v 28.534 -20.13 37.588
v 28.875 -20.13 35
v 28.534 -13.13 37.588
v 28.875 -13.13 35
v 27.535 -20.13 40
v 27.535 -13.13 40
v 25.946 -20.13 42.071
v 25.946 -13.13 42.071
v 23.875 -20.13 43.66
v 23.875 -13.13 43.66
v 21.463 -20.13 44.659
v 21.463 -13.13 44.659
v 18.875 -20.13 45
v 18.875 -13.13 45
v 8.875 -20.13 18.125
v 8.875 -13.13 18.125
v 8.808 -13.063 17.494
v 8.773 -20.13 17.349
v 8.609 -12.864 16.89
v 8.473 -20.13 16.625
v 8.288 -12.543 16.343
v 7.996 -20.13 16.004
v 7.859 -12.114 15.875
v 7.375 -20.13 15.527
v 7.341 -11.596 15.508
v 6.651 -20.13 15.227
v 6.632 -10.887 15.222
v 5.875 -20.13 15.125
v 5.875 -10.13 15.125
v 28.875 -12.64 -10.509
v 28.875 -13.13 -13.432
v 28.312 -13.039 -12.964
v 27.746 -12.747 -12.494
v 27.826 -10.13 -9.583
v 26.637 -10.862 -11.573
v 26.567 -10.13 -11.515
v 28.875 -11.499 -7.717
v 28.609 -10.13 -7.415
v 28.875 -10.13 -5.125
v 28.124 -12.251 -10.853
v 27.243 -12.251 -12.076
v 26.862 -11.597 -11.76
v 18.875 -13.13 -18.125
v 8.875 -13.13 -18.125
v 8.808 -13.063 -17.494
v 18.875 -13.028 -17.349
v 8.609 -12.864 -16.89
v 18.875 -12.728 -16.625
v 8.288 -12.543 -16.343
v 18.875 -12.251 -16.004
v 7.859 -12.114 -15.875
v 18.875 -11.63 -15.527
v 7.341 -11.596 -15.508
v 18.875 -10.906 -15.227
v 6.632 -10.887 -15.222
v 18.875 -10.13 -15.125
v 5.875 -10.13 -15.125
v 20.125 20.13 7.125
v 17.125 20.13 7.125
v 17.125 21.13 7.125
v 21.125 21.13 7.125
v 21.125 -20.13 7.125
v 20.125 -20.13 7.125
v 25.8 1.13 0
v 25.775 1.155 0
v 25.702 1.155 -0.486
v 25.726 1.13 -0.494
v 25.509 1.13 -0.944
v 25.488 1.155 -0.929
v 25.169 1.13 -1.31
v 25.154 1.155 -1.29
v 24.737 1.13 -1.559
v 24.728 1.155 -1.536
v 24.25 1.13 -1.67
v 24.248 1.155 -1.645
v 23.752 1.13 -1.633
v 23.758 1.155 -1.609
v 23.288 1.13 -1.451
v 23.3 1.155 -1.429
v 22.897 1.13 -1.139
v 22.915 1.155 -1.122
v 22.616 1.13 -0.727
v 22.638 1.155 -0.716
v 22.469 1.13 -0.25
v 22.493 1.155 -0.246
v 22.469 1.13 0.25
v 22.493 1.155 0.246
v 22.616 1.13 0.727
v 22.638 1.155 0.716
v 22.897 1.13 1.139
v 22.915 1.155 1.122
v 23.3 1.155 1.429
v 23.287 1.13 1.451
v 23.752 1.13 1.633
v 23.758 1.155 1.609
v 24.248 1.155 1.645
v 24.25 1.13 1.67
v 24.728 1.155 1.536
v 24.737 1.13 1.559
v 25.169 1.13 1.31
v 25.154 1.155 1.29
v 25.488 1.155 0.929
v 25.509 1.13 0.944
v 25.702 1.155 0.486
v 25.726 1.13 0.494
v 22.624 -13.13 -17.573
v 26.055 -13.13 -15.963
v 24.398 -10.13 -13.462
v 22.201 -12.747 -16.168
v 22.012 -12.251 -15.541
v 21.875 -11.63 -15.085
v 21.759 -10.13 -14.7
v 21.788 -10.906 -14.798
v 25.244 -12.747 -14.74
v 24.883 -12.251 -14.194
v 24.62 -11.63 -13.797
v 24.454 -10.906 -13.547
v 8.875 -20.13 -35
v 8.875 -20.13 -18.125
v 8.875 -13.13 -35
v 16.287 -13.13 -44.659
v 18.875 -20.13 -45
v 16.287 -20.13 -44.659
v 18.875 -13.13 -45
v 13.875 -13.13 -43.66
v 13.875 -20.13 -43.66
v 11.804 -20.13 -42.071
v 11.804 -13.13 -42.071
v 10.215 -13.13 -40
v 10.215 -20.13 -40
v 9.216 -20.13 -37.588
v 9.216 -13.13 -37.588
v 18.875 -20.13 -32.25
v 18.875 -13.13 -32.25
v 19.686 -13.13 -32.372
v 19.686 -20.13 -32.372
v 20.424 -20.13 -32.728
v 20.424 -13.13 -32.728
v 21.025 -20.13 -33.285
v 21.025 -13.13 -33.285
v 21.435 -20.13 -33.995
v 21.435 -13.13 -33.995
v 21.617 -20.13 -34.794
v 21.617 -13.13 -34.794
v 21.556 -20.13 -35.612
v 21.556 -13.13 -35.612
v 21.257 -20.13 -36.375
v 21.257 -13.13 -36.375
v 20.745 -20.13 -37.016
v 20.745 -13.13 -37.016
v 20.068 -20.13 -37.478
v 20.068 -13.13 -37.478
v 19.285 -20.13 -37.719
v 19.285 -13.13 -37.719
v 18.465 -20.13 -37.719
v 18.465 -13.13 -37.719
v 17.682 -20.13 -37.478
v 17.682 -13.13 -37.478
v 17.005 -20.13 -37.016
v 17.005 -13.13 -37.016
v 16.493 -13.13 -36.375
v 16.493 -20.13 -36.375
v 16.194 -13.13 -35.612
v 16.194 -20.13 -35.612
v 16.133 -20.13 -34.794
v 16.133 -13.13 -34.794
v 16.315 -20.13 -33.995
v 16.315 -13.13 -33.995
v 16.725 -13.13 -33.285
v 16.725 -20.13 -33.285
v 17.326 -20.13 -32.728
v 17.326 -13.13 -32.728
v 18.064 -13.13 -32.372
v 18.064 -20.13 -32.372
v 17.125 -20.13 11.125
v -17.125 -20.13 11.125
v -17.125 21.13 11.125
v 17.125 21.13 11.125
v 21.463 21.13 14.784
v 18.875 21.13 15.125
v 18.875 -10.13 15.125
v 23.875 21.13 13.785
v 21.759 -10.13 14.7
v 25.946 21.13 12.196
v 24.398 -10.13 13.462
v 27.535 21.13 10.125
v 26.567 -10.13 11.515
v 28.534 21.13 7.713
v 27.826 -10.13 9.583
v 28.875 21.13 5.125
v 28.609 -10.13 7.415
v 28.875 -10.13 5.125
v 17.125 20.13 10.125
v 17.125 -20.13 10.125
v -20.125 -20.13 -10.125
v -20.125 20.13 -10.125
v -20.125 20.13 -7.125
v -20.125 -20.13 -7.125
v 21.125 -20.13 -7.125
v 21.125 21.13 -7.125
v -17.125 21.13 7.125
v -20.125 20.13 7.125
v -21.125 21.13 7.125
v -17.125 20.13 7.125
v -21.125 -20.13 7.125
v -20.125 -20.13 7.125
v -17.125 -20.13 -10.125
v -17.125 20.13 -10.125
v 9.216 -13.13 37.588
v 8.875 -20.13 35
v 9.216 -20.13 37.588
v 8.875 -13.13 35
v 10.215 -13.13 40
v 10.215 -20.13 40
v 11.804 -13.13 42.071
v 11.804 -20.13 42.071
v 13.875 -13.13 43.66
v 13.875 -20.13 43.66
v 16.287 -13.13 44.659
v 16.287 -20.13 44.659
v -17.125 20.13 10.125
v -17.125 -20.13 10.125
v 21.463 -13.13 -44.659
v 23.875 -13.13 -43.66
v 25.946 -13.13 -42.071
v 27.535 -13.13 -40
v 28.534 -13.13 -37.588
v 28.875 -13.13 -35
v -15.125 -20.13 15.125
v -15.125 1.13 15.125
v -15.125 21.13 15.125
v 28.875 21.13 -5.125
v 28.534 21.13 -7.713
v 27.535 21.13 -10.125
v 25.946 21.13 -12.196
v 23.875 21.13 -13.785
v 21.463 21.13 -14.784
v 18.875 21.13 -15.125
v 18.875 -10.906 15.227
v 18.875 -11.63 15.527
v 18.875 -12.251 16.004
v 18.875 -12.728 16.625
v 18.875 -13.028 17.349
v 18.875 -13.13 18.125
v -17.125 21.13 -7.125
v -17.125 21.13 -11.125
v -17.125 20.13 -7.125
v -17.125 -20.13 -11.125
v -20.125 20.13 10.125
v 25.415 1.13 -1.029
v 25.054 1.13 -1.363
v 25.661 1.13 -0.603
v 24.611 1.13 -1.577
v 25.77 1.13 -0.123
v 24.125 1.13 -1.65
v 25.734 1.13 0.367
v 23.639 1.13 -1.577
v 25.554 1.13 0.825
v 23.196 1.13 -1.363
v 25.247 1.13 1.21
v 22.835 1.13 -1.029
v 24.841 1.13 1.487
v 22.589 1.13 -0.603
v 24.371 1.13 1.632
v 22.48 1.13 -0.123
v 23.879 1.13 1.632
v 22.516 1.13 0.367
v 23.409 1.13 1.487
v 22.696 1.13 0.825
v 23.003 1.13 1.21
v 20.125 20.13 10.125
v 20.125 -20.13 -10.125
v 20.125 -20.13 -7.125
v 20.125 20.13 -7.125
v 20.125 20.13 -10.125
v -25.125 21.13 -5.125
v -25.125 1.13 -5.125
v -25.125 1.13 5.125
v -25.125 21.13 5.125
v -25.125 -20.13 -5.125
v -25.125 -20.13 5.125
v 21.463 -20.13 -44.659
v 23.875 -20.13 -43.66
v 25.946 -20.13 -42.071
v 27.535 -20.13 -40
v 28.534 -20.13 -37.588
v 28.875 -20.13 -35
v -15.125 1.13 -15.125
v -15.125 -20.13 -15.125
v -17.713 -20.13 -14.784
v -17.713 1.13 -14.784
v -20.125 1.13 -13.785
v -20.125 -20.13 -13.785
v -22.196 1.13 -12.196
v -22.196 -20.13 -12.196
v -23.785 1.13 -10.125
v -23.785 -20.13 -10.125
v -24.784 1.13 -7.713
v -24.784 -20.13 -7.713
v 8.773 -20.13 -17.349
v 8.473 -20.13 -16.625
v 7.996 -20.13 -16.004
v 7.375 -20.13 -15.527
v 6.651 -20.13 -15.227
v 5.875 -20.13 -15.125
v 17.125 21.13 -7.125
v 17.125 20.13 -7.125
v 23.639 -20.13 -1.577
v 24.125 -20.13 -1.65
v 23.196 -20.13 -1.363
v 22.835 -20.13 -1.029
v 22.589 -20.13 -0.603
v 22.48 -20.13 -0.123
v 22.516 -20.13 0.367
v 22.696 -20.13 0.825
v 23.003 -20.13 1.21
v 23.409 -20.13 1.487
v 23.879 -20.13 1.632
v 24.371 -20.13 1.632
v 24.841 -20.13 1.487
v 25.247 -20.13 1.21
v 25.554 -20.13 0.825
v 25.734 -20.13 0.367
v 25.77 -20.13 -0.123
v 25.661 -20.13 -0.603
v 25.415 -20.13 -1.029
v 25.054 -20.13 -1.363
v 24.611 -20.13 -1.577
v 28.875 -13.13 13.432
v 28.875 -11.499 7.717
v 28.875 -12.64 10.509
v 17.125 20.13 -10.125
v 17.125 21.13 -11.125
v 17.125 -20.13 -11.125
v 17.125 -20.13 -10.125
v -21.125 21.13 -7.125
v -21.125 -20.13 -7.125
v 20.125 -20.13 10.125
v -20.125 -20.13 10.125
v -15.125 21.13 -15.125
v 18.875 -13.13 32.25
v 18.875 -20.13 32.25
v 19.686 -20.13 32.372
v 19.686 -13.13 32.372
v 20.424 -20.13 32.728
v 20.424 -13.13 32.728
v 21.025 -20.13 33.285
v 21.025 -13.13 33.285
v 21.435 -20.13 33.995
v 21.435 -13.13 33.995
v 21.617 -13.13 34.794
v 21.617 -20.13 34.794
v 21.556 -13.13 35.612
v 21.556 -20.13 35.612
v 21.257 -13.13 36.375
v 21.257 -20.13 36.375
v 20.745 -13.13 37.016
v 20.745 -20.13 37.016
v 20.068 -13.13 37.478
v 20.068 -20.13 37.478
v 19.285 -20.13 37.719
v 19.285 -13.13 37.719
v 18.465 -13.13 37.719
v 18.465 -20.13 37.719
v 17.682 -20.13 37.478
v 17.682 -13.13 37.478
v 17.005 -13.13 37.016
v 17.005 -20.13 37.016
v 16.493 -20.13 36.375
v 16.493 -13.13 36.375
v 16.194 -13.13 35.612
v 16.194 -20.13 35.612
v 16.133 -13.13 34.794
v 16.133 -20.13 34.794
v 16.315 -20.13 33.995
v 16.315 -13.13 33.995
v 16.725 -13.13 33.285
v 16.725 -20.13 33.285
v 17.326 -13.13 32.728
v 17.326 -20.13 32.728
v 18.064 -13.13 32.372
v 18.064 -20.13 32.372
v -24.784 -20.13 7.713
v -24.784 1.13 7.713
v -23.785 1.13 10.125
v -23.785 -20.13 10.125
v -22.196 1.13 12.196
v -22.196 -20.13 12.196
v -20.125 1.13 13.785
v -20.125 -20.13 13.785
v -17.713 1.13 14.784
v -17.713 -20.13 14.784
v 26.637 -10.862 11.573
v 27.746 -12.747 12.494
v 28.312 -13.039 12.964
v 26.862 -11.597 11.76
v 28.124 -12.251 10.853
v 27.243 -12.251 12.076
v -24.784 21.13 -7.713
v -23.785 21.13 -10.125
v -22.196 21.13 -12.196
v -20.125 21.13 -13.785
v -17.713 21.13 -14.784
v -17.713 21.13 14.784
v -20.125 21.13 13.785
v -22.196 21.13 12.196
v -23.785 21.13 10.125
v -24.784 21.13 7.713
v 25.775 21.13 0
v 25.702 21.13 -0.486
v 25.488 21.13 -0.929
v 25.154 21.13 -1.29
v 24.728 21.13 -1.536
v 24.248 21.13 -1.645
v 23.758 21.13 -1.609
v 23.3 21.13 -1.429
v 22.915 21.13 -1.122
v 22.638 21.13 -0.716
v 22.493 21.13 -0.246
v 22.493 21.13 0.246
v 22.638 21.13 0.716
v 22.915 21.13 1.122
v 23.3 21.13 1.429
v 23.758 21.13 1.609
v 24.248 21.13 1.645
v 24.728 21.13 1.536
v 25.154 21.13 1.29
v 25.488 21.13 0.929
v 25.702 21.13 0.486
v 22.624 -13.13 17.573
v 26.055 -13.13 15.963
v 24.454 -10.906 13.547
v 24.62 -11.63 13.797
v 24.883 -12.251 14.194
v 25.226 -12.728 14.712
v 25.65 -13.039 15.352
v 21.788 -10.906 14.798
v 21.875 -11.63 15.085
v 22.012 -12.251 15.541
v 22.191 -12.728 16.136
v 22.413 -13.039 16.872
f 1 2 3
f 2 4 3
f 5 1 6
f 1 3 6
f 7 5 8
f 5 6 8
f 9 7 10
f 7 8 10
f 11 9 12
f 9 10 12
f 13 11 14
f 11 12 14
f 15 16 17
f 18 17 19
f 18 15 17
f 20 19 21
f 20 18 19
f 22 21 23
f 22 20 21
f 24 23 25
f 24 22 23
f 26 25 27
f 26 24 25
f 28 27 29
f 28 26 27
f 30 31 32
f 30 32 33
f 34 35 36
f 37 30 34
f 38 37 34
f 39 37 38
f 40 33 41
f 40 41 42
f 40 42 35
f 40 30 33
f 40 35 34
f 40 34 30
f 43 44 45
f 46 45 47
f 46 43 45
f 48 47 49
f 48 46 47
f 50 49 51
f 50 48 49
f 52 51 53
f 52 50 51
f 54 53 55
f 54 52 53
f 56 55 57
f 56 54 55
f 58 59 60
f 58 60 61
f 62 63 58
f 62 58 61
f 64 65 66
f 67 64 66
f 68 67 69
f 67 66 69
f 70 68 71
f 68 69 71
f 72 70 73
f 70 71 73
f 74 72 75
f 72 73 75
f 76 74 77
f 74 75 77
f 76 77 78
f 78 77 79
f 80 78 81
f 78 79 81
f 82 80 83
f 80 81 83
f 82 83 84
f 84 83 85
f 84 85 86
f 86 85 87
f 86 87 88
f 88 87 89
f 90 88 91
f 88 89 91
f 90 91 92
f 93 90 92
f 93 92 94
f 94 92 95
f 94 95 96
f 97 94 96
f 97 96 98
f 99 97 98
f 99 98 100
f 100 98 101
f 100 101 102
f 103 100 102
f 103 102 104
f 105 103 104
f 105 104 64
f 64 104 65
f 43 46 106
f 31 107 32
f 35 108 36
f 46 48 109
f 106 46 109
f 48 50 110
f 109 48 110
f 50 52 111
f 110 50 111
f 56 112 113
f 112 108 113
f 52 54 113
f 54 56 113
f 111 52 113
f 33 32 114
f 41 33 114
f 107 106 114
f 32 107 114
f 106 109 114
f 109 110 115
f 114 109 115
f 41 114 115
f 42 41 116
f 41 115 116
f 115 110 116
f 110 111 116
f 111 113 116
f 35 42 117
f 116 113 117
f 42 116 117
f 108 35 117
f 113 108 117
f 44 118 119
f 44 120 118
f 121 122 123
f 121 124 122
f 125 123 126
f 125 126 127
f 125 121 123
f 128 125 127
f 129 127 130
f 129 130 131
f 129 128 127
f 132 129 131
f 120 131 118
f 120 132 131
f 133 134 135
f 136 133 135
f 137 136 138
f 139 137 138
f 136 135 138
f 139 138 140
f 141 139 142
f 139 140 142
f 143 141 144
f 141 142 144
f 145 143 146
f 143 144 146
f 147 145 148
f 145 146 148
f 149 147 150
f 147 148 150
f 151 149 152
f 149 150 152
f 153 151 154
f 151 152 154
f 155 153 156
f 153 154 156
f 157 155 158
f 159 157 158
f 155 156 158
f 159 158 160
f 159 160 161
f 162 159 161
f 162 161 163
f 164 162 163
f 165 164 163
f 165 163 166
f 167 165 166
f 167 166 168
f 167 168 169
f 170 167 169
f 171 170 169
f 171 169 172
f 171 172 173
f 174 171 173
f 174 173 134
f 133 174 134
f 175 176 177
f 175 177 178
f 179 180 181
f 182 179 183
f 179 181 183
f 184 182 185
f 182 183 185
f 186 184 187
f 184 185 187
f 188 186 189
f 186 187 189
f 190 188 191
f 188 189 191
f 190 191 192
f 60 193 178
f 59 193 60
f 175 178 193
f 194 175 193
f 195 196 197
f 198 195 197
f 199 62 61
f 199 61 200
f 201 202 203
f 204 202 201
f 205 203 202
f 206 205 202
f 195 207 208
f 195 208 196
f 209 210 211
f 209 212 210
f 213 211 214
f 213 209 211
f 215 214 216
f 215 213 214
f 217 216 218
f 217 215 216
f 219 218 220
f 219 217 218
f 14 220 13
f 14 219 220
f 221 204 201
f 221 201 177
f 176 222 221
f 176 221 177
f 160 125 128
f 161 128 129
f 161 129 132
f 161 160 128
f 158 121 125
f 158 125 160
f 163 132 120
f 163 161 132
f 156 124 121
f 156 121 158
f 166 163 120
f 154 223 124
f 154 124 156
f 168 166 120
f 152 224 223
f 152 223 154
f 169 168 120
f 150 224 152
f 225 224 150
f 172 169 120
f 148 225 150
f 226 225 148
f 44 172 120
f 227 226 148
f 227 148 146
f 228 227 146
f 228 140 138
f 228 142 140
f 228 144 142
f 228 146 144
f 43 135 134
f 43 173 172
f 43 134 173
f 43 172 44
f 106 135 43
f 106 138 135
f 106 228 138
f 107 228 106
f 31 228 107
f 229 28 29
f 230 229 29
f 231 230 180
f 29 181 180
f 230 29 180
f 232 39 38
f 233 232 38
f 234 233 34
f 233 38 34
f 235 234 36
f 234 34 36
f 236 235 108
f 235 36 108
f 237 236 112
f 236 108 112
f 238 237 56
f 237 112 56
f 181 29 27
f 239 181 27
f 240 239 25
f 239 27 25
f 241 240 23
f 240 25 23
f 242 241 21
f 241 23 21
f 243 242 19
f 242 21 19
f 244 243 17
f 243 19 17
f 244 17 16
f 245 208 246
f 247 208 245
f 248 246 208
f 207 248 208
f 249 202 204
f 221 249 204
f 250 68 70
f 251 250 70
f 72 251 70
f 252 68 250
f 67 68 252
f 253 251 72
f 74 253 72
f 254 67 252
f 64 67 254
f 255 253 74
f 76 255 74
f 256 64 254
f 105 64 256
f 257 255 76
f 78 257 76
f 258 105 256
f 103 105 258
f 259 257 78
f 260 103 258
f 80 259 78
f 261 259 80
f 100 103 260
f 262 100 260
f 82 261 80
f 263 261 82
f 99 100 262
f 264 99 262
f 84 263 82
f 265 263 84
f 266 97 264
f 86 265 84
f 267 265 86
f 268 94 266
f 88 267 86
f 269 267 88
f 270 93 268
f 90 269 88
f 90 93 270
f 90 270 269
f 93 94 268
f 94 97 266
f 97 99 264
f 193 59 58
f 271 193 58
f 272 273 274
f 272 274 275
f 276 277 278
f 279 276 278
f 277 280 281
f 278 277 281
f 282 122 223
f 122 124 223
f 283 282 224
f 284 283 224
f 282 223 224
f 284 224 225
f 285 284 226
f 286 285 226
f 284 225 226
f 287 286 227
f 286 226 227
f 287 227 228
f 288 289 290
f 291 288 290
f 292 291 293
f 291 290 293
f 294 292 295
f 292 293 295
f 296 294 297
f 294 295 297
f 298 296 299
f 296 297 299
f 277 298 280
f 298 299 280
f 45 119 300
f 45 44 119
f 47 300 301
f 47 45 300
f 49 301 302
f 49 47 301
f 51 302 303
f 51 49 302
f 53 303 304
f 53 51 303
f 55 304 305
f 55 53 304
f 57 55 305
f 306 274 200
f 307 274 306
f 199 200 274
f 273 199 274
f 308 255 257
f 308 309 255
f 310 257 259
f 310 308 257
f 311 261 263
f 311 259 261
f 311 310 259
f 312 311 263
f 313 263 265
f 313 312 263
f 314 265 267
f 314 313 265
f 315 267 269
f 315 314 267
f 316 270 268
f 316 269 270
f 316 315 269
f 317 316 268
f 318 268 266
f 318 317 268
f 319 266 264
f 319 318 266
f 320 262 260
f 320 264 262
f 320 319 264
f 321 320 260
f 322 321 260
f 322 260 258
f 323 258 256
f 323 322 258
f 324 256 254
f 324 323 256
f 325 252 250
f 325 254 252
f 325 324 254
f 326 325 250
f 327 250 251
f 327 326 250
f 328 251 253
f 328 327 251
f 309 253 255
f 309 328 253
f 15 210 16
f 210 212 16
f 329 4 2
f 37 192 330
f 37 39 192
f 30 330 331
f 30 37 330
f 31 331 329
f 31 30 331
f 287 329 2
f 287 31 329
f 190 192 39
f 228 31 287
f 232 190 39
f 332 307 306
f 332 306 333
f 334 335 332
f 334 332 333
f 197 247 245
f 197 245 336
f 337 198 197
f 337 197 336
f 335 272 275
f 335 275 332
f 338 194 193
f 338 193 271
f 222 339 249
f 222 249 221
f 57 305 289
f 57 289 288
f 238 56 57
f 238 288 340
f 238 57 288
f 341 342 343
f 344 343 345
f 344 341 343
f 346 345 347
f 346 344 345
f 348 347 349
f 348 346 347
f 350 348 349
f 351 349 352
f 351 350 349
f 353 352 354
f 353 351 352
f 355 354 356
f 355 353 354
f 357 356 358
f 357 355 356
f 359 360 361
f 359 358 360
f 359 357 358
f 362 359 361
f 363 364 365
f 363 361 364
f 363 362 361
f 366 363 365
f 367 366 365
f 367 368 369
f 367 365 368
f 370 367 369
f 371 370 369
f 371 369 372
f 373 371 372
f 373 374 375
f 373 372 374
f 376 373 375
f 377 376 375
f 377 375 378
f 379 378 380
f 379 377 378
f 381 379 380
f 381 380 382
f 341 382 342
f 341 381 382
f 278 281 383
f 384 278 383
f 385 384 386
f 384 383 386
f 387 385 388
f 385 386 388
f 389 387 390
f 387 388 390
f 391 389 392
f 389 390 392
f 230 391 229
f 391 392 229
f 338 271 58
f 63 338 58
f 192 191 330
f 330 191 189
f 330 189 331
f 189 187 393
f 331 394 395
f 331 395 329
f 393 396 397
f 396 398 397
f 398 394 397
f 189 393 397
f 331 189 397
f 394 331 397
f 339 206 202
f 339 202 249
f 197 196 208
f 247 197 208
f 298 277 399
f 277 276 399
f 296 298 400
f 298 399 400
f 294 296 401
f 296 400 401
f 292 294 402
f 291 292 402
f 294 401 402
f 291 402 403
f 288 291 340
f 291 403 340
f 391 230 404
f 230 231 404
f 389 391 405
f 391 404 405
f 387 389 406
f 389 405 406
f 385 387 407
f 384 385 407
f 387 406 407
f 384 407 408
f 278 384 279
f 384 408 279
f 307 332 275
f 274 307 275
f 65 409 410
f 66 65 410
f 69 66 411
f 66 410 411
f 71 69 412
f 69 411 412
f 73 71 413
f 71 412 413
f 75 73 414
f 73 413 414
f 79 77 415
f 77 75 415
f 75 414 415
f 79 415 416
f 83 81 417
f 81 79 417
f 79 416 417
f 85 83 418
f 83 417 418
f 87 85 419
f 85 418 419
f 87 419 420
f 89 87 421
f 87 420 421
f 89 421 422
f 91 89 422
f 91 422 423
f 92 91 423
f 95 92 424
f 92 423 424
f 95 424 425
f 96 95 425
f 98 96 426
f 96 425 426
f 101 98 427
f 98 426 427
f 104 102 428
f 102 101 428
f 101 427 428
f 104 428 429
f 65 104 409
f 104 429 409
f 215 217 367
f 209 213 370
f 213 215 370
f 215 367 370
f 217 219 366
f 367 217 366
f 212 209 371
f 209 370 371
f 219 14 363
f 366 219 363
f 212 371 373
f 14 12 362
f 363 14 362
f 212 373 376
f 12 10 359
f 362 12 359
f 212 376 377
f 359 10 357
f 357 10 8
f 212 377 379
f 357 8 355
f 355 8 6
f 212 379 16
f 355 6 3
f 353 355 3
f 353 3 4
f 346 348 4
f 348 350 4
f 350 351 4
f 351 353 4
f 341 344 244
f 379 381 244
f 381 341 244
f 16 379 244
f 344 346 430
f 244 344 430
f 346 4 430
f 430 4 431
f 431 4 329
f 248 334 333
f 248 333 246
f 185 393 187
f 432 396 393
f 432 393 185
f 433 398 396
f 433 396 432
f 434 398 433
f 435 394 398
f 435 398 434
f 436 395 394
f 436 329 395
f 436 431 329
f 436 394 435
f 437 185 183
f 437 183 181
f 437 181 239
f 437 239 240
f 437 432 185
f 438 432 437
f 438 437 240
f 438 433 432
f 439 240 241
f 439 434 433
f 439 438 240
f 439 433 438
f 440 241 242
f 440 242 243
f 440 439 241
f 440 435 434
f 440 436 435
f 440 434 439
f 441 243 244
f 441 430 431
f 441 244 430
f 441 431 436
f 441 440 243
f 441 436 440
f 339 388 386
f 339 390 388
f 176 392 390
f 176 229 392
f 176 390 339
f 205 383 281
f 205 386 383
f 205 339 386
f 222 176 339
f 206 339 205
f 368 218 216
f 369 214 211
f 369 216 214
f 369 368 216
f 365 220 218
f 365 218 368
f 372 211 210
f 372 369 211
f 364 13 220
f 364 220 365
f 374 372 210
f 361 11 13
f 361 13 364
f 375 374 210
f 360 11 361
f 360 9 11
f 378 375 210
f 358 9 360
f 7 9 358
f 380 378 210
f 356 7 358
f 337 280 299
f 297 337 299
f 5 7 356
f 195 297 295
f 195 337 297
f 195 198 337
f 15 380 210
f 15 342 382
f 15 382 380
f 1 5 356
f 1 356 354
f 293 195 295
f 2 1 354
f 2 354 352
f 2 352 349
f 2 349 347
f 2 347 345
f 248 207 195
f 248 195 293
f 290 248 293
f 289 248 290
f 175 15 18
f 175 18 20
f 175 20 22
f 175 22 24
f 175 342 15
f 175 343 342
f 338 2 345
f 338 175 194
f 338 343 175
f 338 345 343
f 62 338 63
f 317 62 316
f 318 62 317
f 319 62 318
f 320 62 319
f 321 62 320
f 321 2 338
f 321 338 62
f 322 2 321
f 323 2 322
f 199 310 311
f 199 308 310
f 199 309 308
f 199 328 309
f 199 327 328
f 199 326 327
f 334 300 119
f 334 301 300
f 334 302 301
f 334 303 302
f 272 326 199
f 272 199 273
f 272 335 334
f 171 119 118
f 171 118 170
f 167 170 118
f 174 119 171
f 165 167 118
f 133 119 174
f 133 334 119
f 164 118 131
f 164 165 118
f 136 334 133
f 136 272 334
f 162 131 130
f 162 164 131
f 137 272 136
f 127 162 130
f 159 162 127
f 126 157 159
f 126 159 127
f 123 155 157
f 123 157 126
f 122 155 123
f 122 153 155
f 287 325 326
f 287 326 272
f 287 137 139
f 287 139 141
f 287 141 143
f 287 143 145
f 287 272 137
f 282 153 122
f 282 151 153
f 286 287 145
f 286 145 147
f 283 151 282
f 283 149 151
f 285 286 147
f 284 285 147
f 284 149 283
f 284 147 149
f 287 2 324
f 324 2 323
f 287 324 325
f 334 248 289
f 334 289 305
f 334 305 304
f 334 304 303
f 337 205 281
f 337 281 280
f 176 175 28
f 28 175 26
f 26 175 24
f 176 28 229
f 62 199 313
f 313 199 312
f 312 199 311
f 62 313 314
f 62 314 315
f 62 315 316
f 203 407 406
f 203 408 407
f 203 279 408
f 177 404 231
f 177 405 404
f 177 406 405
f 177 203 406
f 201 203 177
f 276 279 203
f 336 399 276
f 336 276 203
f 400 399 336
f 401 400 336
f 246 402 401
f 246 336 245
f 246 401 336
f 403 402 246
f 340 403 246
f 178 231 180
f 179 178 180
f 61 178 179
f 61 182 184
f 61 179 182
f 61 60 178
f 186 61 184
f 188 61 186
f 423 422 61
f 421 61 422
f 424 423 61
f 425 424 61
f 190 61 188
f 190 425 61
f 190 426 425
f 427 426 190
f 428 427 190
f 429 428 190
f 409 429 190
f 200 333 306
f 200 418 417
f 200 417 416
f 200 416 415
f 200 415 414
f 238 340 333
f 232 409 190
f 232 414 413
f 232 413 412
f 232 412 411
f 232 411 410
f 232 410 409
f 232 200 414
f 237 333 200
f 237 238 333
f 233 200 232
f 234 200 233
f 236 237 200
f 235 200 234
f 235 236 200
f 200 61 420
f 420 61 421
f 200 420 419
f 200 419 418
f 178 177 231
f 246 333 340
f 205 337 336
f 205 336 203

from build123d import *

# Parameters (mm, degrees)
BOSS_EXTRUDE1_DEPTH                   = 1
BOSS_EXTRUDE1_DEPTH_BACK              = 19
SKETCH1_W                             = 50.25
SKETCH1_H                             = 30.25
BOSS_EXTRUDE2_DEPTH                   = 30.25
BOSS_EXTRUDE3_DEPTH                   = 5
M6_CLEARANCE_HOLE1_D                  = 6.6
M6_CLEARANCE_HOLE1_CSINK_D            = 6.65
M6_CLEARANCE_HOLE1_CSINK_ANGLE        = 90
SKETCH6_W                             = 4
SKETCH6_H                             = 4
BOSS_EXTRUDE4_DEPTH                   = 1
FILLET1_R                             = 10
TAP_DRILL_FOR_M4X0_7_TAP1_D           = 3.3
TAP_DRILL_FOR_M4X0_7_TAP1_CSINK_D     = 3.35
TAP_DRILL_FOR_M4X0_7_TAP1_CSINK_ANGLE = 90
CUT_EXTRUDE1_DEPTH                    = 92.330529534
CUT_EXTRUDE1_DEPTH_BACK               = 92.330529534
SKETCH13_OUTSIDE_W                    = 121.742
SKETCH13_OUTSIDE_H                    = 131.492
BOSS_EXTRUDE5_START                   = 21.26
BOSS_EXTRUDE5_DEPTH                   = 21.26
CUT_EXTRUDE2_DEPTH                    = 53.582495662
CUT_EXTRUDE2_DEPTH_BACK               = 53.582495662
SKETCH15_R                            = 1.65
BOSS_EXTRUDE6_REACH                   = 66.778
SKETCH16_W                            = 10
SKETCH16_H                            = 7
SKETCH17_W                            = 29.875
SKETCH17_H                            = 7
BOSS_EXTRUDE7_DEPTH                   = 20
FILLET5_R                             = 10
FILLET6_R                             = 3
SKETCH19_R                            = 2.75
CUT_EXTRUDE4_DEPTH                    = 64.502072703
FILLET7_R                             = 3
FILLET8_R                             = 10


with BuildPart() as part:
    # Sketch1 → Boss-Extrude1 (new, two sides: drawn at the far end of the back side and taken through both)
    with BuildSketch(Plane(origin=(0, 20.13, 0), x_dir=(1, 0, 0), z_dir=(0, 1, 0)).offset(-BOSS_EXTRUDE1_DEPTH_BACK)):
        Rectangle(SKETCH1_W, SKETCH1_H)
        Polygon((20.125, 10.125), (17.125, 10.125), (17.125, 11.125), (-17.125, 11.125), (-17.125, 10.125), (-20.125, 10.125), (-20.125, 7.125), (-21.125, 7.125), (-21.125, -7.125), (-20.125, -7.125), (-20.125, -10.125), (-17.125, -10.125), (-17.125, -11.125), (17.125, -11.125), (17.125, -10.125), (20.125, -10.125), (20.125, -7.125), (21.125, -7.125), (21.125, 7.125), (20.125, 7.125), align=None, mode=Mode.SUBTRACT)
    extrude(amount=BOSS_EXTRUDE1_DEPTH + BOSS_EXTRUDE1_DEPTH_BACK)

    # Sketch2 → Boss-Extrude2 (add)
    with BuildSketch(Plane.XY.offset(15.125)):
        Polygon((25.125, 21.13), (45.125, 21.13), (45.125, 61.13), (65.125, 61.13), (65.125, 1.13), (25.125, 1.13), align=None)
    extrude(amount=-BOSS_EXTRUDE2_DEPTH)

    # Sketch3 → Boss-Extrude3 (add)
    with BuildSketch(Plane(origin=(0, 61.13, 0), x_dir=(1, 0, 0), z_dir=(0, 1, 0))):
        with BuildLine():
            Line((65.125, 40), (65.125, -40))
            ThreePointArc((65.125, -40), (55.125, -50), (45.125, -40))
            Line((45.125, -40), (45.125, 40))
            ThreePointArc((45.125, 40), (55.125, 50), (65.125, 40))
        make_face()
    extrude(amount=-BOSS_EXTRUDE3_DEPTH)

    # M6 Clearance Hole1 (through all)
    with Locations(Plane(origin=(0, 56.13, 0), x_dir=(-1, 0, 0), z_dir=(0, -1, 0))):
        with Locations((-55.125, -40), (-55.125, 40)):
            CounterSinkHole(M6_CLEARANCE_HOLE1_D / 2, M6_CLEARANCE_HOLE1_CSINK_D / 2, counter_sink_angle=M6_CLEARANCE_HOLE1_CSINK_ANGLE)

    # Sketch6 → Boss-Extrude4 (add)
    with BuildSketch(Plane(origin=(0, 21.13, 0), x_dir=(1, 0, 0), z_dir=(0, 1, 0))):
        with Locations((19.125, 9.125)):
            Rectangle(SKETCH6_W, SKETCH6_H)
        with Locations((19.125, -9.125)):
            Rectangle(SKETCH6_W, SKETCH6_H)
        with Locations((-19.125, -9.125)):
            Rectangle(SKETCH6_W, SKETCH6_H)
        with Locations((-19.125, 9.125)):
            Rectangle(SKETCH6_W, SKETCH6_H)
    extrude(amount=-BOSS_EXTRUDE4_DEPTH)

    # Fillet1
    fillet1_edges = [part.edges().sort_by_distance(p)[0] for p in [
        (45.125, 21.13, 0),
        (65.125, 1.13, 0),
        (55.125, 56.13, -15.125),
        (55.125, 56.13, 15.125),
        (-25.125, 11.13, 15.125),
        (-25.125, 11.13, -15.125),
    ]]
    fillet(fillet1_edges, radius=FILLET1_R)

    # Tap Drill for M4x0.7 Tap1 (through all)
    with Locations(Plane(origin=(0, 1.13, 0), x_dir=(-1, 0, 0), z_dir=(0, -1, 0))):
        with Locations((-24.125, 0)):
            CounterSinkHole(TAP_DRILL_FOR_M4X0_7_TAP1_D / 2, TAP_DRILL_FOR_M4X0_7_TAP1_CSINK_D / 2, counter_sink_angle=TAP_DRILL_FOR_M4X0_7_TAP1_CSINK_ANGLE)

    # Sketch13 outside → Cut-Extrude1 (cut, two sides: drawn at the far end of the back side and taken through both)
    with BuildSketch(Plane(origin=(0, 21.13, 0), x_dir=(1, 0, 0), z_dir=(0, 1, 0)).offset(-CUT_EXTRUDE1_DEPTH_BACK)):
        with Locations((20, 0)):
            Rectangle(SKETCH13_OUTSIDE_W, SKETCH13_OUTSIDE_H)
        with BuildLine():
            Line((28.875, 5.125), (28.875, -5.125))
            ThreePointArc((28.875, -5.125), (25.946067812, -12.196067812), (18.875, -15.125))
            Line((18.875, -15.125), (-15.125, -15.125))
            ThreePointArc((-15.125, -15.125), (-22.196067812, -12.196067812), (-25.125, -5.125))
            Line((-25.125, -5.125), (-25.125, 5.125))
            ThreePointArc((-25.125, 5.125), (-22.196067812, 12.196067812), (-15.125, 15.125))
            Line((-15.125, 15.125), (18.875, 15.125))
            ThreePointArc((18.875, 15.125), (25.946067812, 12.196067812), (28.875, 5.125))
        make_face(mode=Mode.SUBTRACT)
    extrude(amount=CUT_EXTRUDE1_DEPTH + CUT_EXTRUDE1_DEPTH_BACK, mode=Mode.SUBTRACT)

    # Sketch14 → Boss-Extrude5 (add)
    with BuildSketch(Plane.XZ.offset(-1.13).offset(BOSS_EXTRUDE5_START)):
        with BuildLine():
            Line((28.875, 5.125), (28.875, -5.125))
            ThreePointArc((28.875, -5.125), (25.946067812, -12.196067812), (18.875, -15.125))
            Line((18.875, -15.125), (-15.125, -15.125))
            ThreePointArc((-15.125, -15.125), (-22.196067812, -12.196067812), (-25.125, -5.125))
            Line((-25.125, -5.125), (-25.125, 5.125))
            ThreePointArc((-25.125, 5.125), (-22.196067812, 12.196067812), (-15.125, 15.125))
            Line((-15.125, 15.125), (18.875, 15.125))
            ThreePointArc((18.875, 15.125), (25.946067812, 12.196067812), (28.875, 5.125))
        make_face()
        Polygon((-21.125, 7.125), (-20.125, 7.125), (-20.125, 10.125), (-17.125, 10.125), (-17.125, 11.125), (17.125, 11.125), (17.125, 10.125), (20.125, 10.125), (20.125, 7.125), (21.125, 7.125), (21.125, -7.125), (20.125, -7.125), (20.125, -10.125), (17.125, -10.125), (17.125, -11.125), (-17.125, -11.125), (-17.125, -10.125), (-20.125, -10.125), (-20.125, -7.125), (-21.125, -7.125), align=None, mode=Mode.SUBTRACT)
    extrude(amount=-BOSS_EXTRUDE5_DEPTH)

    # Sketch15 → Cut-Extrude2 (cut, two sides: drawn at the far end of the back side and taken through both)
    with BuildSketch(Plane(origin=(0, 21.13, 0), x_dir=(1, 0, 0), z_dir=(0, 1, 0)).offset(-CUT_EXTRUDE2_DEPTH_BACK)):
        with Locations(Location((24.125, 0, 0), (0, 0, 90))):
            Circle(SKETCH15_R)
    extrude(amount=CUT_EXTRUDE2_DEPTH + CUT_EXTRUDE2_DEPTH_BACK, mode=Mode.SUBTRACT)

    # Sketch16 → Boss-Extrude6 (add, up to next)
    with BuildSketch(Plane(origin=(28.875, 0, 13.75), x_dir=(0, 0, 1), z_dir=(-1, 0, 0)), mode=Mode.PRIVATE) as boss_extrude6_sk1:
        with Locations((-23.875, -16.63)):
            Rectangle(SKETCH16_W, SKETCH16_H)
    boss_extrude6_tool1 = extrude(boss_extrude6_sk1.sketch, amount=BOSS_EXTRUDE6_REACH, mode=Mode.PRIVATE) - part.part
    boss_extrude6 = boss_extrude6_tool1.solids().sort_by_distance((28.875, -16.63, -10.125))[0]
    add(boss_extrude6)

    # Sketch17 → Boss-Extrude7 (add)
    with BuildSketch(Plane.ZY.offset(-28.875)):
        with Locations((-30.0625, -16.63)):
            Rectangle(SKETCH17_W, SKETCH17_H)
    boss_extrude7 = extrude(amount=BOSS_EXTRUDE7_DEPTH)

    # Fillet5
    fillet5_edges = [part.edges().sort_by_distance(p)[0] for p in [
        (8.875, -16.63, -45),
        (28.875, -16.63, -45),
    ]]
    fillet(fillet5_edges, radius=FILLET5_R - 0.0001)  # a hair under: the kernel refuses the full size

    # Fillet6
    fillet6_edges = [part.edges().sort_by_distance(p)[0] for p in [
        (25.946067812, -13.13, -12.196067812),
        (13.875, -13.13, -15.125),
        (8.875, -16.63, -15.125),
    ]]
    fillet(fillet6_edges, radius=FILLET6_R)

    # Sketch19 → Cut-Extrude4 (cut, through all)
    with BuildSketch(Plane(origin=(0, -13.13, 0), x_dir=(1, 0, 0), z_dir=(0, 1, 0))):
        with Locations(Location((18.875, 35, 0), (0, 0, 270))):
            Circle(SKETCH19_R)
    cut_extrude4 = extrude(amount=-CUT_EXTRUDE4_DEPTH, mode=Mode.SUBTRACT)

    # Mirror2: Boss-Extrude6 across plane
    add(boss_extrude6.mirror(Plane.XY))

    # Mirror4: Boss-Extrude7 across plane
    add(boss_extrude7.mirror(Plane.XY))

    # Fillet7
    fillet7_edges = [part.edges().sort_by_distance(p)[0] for p in [
        (13.875, -13.13, 15.125),
        (25.946067812, -13.13, 12.196067812),
    ]]
    fillet(fillet7_edges, radius=FILLET7_R)
    fillet7_2_edges = [part.edges().sort_by_distance(p)[0] for p in [
        (8.875, -16.63, 15.125),
    ]]
    fillet(fillet7_2_edges, radius=FILLET7_R)

    # Fillet8
    fillet8_edges = [part.edges().sort_by_distance(p)[0] for p in [
        (8.875, -16.63, 45),
        (28.875, -16.63, 45),
    ]]
    fillet(fillet8_edges, radius=FILLET8_R - 0.0001)  # a hair under: the kernel refuses the full size

    # Mirror8: Cut-Extrude4 across plane
    add(cut_extrude4.mirror(Plane.XY), mode=Mode.SUBTRACT)


solid = part.part
